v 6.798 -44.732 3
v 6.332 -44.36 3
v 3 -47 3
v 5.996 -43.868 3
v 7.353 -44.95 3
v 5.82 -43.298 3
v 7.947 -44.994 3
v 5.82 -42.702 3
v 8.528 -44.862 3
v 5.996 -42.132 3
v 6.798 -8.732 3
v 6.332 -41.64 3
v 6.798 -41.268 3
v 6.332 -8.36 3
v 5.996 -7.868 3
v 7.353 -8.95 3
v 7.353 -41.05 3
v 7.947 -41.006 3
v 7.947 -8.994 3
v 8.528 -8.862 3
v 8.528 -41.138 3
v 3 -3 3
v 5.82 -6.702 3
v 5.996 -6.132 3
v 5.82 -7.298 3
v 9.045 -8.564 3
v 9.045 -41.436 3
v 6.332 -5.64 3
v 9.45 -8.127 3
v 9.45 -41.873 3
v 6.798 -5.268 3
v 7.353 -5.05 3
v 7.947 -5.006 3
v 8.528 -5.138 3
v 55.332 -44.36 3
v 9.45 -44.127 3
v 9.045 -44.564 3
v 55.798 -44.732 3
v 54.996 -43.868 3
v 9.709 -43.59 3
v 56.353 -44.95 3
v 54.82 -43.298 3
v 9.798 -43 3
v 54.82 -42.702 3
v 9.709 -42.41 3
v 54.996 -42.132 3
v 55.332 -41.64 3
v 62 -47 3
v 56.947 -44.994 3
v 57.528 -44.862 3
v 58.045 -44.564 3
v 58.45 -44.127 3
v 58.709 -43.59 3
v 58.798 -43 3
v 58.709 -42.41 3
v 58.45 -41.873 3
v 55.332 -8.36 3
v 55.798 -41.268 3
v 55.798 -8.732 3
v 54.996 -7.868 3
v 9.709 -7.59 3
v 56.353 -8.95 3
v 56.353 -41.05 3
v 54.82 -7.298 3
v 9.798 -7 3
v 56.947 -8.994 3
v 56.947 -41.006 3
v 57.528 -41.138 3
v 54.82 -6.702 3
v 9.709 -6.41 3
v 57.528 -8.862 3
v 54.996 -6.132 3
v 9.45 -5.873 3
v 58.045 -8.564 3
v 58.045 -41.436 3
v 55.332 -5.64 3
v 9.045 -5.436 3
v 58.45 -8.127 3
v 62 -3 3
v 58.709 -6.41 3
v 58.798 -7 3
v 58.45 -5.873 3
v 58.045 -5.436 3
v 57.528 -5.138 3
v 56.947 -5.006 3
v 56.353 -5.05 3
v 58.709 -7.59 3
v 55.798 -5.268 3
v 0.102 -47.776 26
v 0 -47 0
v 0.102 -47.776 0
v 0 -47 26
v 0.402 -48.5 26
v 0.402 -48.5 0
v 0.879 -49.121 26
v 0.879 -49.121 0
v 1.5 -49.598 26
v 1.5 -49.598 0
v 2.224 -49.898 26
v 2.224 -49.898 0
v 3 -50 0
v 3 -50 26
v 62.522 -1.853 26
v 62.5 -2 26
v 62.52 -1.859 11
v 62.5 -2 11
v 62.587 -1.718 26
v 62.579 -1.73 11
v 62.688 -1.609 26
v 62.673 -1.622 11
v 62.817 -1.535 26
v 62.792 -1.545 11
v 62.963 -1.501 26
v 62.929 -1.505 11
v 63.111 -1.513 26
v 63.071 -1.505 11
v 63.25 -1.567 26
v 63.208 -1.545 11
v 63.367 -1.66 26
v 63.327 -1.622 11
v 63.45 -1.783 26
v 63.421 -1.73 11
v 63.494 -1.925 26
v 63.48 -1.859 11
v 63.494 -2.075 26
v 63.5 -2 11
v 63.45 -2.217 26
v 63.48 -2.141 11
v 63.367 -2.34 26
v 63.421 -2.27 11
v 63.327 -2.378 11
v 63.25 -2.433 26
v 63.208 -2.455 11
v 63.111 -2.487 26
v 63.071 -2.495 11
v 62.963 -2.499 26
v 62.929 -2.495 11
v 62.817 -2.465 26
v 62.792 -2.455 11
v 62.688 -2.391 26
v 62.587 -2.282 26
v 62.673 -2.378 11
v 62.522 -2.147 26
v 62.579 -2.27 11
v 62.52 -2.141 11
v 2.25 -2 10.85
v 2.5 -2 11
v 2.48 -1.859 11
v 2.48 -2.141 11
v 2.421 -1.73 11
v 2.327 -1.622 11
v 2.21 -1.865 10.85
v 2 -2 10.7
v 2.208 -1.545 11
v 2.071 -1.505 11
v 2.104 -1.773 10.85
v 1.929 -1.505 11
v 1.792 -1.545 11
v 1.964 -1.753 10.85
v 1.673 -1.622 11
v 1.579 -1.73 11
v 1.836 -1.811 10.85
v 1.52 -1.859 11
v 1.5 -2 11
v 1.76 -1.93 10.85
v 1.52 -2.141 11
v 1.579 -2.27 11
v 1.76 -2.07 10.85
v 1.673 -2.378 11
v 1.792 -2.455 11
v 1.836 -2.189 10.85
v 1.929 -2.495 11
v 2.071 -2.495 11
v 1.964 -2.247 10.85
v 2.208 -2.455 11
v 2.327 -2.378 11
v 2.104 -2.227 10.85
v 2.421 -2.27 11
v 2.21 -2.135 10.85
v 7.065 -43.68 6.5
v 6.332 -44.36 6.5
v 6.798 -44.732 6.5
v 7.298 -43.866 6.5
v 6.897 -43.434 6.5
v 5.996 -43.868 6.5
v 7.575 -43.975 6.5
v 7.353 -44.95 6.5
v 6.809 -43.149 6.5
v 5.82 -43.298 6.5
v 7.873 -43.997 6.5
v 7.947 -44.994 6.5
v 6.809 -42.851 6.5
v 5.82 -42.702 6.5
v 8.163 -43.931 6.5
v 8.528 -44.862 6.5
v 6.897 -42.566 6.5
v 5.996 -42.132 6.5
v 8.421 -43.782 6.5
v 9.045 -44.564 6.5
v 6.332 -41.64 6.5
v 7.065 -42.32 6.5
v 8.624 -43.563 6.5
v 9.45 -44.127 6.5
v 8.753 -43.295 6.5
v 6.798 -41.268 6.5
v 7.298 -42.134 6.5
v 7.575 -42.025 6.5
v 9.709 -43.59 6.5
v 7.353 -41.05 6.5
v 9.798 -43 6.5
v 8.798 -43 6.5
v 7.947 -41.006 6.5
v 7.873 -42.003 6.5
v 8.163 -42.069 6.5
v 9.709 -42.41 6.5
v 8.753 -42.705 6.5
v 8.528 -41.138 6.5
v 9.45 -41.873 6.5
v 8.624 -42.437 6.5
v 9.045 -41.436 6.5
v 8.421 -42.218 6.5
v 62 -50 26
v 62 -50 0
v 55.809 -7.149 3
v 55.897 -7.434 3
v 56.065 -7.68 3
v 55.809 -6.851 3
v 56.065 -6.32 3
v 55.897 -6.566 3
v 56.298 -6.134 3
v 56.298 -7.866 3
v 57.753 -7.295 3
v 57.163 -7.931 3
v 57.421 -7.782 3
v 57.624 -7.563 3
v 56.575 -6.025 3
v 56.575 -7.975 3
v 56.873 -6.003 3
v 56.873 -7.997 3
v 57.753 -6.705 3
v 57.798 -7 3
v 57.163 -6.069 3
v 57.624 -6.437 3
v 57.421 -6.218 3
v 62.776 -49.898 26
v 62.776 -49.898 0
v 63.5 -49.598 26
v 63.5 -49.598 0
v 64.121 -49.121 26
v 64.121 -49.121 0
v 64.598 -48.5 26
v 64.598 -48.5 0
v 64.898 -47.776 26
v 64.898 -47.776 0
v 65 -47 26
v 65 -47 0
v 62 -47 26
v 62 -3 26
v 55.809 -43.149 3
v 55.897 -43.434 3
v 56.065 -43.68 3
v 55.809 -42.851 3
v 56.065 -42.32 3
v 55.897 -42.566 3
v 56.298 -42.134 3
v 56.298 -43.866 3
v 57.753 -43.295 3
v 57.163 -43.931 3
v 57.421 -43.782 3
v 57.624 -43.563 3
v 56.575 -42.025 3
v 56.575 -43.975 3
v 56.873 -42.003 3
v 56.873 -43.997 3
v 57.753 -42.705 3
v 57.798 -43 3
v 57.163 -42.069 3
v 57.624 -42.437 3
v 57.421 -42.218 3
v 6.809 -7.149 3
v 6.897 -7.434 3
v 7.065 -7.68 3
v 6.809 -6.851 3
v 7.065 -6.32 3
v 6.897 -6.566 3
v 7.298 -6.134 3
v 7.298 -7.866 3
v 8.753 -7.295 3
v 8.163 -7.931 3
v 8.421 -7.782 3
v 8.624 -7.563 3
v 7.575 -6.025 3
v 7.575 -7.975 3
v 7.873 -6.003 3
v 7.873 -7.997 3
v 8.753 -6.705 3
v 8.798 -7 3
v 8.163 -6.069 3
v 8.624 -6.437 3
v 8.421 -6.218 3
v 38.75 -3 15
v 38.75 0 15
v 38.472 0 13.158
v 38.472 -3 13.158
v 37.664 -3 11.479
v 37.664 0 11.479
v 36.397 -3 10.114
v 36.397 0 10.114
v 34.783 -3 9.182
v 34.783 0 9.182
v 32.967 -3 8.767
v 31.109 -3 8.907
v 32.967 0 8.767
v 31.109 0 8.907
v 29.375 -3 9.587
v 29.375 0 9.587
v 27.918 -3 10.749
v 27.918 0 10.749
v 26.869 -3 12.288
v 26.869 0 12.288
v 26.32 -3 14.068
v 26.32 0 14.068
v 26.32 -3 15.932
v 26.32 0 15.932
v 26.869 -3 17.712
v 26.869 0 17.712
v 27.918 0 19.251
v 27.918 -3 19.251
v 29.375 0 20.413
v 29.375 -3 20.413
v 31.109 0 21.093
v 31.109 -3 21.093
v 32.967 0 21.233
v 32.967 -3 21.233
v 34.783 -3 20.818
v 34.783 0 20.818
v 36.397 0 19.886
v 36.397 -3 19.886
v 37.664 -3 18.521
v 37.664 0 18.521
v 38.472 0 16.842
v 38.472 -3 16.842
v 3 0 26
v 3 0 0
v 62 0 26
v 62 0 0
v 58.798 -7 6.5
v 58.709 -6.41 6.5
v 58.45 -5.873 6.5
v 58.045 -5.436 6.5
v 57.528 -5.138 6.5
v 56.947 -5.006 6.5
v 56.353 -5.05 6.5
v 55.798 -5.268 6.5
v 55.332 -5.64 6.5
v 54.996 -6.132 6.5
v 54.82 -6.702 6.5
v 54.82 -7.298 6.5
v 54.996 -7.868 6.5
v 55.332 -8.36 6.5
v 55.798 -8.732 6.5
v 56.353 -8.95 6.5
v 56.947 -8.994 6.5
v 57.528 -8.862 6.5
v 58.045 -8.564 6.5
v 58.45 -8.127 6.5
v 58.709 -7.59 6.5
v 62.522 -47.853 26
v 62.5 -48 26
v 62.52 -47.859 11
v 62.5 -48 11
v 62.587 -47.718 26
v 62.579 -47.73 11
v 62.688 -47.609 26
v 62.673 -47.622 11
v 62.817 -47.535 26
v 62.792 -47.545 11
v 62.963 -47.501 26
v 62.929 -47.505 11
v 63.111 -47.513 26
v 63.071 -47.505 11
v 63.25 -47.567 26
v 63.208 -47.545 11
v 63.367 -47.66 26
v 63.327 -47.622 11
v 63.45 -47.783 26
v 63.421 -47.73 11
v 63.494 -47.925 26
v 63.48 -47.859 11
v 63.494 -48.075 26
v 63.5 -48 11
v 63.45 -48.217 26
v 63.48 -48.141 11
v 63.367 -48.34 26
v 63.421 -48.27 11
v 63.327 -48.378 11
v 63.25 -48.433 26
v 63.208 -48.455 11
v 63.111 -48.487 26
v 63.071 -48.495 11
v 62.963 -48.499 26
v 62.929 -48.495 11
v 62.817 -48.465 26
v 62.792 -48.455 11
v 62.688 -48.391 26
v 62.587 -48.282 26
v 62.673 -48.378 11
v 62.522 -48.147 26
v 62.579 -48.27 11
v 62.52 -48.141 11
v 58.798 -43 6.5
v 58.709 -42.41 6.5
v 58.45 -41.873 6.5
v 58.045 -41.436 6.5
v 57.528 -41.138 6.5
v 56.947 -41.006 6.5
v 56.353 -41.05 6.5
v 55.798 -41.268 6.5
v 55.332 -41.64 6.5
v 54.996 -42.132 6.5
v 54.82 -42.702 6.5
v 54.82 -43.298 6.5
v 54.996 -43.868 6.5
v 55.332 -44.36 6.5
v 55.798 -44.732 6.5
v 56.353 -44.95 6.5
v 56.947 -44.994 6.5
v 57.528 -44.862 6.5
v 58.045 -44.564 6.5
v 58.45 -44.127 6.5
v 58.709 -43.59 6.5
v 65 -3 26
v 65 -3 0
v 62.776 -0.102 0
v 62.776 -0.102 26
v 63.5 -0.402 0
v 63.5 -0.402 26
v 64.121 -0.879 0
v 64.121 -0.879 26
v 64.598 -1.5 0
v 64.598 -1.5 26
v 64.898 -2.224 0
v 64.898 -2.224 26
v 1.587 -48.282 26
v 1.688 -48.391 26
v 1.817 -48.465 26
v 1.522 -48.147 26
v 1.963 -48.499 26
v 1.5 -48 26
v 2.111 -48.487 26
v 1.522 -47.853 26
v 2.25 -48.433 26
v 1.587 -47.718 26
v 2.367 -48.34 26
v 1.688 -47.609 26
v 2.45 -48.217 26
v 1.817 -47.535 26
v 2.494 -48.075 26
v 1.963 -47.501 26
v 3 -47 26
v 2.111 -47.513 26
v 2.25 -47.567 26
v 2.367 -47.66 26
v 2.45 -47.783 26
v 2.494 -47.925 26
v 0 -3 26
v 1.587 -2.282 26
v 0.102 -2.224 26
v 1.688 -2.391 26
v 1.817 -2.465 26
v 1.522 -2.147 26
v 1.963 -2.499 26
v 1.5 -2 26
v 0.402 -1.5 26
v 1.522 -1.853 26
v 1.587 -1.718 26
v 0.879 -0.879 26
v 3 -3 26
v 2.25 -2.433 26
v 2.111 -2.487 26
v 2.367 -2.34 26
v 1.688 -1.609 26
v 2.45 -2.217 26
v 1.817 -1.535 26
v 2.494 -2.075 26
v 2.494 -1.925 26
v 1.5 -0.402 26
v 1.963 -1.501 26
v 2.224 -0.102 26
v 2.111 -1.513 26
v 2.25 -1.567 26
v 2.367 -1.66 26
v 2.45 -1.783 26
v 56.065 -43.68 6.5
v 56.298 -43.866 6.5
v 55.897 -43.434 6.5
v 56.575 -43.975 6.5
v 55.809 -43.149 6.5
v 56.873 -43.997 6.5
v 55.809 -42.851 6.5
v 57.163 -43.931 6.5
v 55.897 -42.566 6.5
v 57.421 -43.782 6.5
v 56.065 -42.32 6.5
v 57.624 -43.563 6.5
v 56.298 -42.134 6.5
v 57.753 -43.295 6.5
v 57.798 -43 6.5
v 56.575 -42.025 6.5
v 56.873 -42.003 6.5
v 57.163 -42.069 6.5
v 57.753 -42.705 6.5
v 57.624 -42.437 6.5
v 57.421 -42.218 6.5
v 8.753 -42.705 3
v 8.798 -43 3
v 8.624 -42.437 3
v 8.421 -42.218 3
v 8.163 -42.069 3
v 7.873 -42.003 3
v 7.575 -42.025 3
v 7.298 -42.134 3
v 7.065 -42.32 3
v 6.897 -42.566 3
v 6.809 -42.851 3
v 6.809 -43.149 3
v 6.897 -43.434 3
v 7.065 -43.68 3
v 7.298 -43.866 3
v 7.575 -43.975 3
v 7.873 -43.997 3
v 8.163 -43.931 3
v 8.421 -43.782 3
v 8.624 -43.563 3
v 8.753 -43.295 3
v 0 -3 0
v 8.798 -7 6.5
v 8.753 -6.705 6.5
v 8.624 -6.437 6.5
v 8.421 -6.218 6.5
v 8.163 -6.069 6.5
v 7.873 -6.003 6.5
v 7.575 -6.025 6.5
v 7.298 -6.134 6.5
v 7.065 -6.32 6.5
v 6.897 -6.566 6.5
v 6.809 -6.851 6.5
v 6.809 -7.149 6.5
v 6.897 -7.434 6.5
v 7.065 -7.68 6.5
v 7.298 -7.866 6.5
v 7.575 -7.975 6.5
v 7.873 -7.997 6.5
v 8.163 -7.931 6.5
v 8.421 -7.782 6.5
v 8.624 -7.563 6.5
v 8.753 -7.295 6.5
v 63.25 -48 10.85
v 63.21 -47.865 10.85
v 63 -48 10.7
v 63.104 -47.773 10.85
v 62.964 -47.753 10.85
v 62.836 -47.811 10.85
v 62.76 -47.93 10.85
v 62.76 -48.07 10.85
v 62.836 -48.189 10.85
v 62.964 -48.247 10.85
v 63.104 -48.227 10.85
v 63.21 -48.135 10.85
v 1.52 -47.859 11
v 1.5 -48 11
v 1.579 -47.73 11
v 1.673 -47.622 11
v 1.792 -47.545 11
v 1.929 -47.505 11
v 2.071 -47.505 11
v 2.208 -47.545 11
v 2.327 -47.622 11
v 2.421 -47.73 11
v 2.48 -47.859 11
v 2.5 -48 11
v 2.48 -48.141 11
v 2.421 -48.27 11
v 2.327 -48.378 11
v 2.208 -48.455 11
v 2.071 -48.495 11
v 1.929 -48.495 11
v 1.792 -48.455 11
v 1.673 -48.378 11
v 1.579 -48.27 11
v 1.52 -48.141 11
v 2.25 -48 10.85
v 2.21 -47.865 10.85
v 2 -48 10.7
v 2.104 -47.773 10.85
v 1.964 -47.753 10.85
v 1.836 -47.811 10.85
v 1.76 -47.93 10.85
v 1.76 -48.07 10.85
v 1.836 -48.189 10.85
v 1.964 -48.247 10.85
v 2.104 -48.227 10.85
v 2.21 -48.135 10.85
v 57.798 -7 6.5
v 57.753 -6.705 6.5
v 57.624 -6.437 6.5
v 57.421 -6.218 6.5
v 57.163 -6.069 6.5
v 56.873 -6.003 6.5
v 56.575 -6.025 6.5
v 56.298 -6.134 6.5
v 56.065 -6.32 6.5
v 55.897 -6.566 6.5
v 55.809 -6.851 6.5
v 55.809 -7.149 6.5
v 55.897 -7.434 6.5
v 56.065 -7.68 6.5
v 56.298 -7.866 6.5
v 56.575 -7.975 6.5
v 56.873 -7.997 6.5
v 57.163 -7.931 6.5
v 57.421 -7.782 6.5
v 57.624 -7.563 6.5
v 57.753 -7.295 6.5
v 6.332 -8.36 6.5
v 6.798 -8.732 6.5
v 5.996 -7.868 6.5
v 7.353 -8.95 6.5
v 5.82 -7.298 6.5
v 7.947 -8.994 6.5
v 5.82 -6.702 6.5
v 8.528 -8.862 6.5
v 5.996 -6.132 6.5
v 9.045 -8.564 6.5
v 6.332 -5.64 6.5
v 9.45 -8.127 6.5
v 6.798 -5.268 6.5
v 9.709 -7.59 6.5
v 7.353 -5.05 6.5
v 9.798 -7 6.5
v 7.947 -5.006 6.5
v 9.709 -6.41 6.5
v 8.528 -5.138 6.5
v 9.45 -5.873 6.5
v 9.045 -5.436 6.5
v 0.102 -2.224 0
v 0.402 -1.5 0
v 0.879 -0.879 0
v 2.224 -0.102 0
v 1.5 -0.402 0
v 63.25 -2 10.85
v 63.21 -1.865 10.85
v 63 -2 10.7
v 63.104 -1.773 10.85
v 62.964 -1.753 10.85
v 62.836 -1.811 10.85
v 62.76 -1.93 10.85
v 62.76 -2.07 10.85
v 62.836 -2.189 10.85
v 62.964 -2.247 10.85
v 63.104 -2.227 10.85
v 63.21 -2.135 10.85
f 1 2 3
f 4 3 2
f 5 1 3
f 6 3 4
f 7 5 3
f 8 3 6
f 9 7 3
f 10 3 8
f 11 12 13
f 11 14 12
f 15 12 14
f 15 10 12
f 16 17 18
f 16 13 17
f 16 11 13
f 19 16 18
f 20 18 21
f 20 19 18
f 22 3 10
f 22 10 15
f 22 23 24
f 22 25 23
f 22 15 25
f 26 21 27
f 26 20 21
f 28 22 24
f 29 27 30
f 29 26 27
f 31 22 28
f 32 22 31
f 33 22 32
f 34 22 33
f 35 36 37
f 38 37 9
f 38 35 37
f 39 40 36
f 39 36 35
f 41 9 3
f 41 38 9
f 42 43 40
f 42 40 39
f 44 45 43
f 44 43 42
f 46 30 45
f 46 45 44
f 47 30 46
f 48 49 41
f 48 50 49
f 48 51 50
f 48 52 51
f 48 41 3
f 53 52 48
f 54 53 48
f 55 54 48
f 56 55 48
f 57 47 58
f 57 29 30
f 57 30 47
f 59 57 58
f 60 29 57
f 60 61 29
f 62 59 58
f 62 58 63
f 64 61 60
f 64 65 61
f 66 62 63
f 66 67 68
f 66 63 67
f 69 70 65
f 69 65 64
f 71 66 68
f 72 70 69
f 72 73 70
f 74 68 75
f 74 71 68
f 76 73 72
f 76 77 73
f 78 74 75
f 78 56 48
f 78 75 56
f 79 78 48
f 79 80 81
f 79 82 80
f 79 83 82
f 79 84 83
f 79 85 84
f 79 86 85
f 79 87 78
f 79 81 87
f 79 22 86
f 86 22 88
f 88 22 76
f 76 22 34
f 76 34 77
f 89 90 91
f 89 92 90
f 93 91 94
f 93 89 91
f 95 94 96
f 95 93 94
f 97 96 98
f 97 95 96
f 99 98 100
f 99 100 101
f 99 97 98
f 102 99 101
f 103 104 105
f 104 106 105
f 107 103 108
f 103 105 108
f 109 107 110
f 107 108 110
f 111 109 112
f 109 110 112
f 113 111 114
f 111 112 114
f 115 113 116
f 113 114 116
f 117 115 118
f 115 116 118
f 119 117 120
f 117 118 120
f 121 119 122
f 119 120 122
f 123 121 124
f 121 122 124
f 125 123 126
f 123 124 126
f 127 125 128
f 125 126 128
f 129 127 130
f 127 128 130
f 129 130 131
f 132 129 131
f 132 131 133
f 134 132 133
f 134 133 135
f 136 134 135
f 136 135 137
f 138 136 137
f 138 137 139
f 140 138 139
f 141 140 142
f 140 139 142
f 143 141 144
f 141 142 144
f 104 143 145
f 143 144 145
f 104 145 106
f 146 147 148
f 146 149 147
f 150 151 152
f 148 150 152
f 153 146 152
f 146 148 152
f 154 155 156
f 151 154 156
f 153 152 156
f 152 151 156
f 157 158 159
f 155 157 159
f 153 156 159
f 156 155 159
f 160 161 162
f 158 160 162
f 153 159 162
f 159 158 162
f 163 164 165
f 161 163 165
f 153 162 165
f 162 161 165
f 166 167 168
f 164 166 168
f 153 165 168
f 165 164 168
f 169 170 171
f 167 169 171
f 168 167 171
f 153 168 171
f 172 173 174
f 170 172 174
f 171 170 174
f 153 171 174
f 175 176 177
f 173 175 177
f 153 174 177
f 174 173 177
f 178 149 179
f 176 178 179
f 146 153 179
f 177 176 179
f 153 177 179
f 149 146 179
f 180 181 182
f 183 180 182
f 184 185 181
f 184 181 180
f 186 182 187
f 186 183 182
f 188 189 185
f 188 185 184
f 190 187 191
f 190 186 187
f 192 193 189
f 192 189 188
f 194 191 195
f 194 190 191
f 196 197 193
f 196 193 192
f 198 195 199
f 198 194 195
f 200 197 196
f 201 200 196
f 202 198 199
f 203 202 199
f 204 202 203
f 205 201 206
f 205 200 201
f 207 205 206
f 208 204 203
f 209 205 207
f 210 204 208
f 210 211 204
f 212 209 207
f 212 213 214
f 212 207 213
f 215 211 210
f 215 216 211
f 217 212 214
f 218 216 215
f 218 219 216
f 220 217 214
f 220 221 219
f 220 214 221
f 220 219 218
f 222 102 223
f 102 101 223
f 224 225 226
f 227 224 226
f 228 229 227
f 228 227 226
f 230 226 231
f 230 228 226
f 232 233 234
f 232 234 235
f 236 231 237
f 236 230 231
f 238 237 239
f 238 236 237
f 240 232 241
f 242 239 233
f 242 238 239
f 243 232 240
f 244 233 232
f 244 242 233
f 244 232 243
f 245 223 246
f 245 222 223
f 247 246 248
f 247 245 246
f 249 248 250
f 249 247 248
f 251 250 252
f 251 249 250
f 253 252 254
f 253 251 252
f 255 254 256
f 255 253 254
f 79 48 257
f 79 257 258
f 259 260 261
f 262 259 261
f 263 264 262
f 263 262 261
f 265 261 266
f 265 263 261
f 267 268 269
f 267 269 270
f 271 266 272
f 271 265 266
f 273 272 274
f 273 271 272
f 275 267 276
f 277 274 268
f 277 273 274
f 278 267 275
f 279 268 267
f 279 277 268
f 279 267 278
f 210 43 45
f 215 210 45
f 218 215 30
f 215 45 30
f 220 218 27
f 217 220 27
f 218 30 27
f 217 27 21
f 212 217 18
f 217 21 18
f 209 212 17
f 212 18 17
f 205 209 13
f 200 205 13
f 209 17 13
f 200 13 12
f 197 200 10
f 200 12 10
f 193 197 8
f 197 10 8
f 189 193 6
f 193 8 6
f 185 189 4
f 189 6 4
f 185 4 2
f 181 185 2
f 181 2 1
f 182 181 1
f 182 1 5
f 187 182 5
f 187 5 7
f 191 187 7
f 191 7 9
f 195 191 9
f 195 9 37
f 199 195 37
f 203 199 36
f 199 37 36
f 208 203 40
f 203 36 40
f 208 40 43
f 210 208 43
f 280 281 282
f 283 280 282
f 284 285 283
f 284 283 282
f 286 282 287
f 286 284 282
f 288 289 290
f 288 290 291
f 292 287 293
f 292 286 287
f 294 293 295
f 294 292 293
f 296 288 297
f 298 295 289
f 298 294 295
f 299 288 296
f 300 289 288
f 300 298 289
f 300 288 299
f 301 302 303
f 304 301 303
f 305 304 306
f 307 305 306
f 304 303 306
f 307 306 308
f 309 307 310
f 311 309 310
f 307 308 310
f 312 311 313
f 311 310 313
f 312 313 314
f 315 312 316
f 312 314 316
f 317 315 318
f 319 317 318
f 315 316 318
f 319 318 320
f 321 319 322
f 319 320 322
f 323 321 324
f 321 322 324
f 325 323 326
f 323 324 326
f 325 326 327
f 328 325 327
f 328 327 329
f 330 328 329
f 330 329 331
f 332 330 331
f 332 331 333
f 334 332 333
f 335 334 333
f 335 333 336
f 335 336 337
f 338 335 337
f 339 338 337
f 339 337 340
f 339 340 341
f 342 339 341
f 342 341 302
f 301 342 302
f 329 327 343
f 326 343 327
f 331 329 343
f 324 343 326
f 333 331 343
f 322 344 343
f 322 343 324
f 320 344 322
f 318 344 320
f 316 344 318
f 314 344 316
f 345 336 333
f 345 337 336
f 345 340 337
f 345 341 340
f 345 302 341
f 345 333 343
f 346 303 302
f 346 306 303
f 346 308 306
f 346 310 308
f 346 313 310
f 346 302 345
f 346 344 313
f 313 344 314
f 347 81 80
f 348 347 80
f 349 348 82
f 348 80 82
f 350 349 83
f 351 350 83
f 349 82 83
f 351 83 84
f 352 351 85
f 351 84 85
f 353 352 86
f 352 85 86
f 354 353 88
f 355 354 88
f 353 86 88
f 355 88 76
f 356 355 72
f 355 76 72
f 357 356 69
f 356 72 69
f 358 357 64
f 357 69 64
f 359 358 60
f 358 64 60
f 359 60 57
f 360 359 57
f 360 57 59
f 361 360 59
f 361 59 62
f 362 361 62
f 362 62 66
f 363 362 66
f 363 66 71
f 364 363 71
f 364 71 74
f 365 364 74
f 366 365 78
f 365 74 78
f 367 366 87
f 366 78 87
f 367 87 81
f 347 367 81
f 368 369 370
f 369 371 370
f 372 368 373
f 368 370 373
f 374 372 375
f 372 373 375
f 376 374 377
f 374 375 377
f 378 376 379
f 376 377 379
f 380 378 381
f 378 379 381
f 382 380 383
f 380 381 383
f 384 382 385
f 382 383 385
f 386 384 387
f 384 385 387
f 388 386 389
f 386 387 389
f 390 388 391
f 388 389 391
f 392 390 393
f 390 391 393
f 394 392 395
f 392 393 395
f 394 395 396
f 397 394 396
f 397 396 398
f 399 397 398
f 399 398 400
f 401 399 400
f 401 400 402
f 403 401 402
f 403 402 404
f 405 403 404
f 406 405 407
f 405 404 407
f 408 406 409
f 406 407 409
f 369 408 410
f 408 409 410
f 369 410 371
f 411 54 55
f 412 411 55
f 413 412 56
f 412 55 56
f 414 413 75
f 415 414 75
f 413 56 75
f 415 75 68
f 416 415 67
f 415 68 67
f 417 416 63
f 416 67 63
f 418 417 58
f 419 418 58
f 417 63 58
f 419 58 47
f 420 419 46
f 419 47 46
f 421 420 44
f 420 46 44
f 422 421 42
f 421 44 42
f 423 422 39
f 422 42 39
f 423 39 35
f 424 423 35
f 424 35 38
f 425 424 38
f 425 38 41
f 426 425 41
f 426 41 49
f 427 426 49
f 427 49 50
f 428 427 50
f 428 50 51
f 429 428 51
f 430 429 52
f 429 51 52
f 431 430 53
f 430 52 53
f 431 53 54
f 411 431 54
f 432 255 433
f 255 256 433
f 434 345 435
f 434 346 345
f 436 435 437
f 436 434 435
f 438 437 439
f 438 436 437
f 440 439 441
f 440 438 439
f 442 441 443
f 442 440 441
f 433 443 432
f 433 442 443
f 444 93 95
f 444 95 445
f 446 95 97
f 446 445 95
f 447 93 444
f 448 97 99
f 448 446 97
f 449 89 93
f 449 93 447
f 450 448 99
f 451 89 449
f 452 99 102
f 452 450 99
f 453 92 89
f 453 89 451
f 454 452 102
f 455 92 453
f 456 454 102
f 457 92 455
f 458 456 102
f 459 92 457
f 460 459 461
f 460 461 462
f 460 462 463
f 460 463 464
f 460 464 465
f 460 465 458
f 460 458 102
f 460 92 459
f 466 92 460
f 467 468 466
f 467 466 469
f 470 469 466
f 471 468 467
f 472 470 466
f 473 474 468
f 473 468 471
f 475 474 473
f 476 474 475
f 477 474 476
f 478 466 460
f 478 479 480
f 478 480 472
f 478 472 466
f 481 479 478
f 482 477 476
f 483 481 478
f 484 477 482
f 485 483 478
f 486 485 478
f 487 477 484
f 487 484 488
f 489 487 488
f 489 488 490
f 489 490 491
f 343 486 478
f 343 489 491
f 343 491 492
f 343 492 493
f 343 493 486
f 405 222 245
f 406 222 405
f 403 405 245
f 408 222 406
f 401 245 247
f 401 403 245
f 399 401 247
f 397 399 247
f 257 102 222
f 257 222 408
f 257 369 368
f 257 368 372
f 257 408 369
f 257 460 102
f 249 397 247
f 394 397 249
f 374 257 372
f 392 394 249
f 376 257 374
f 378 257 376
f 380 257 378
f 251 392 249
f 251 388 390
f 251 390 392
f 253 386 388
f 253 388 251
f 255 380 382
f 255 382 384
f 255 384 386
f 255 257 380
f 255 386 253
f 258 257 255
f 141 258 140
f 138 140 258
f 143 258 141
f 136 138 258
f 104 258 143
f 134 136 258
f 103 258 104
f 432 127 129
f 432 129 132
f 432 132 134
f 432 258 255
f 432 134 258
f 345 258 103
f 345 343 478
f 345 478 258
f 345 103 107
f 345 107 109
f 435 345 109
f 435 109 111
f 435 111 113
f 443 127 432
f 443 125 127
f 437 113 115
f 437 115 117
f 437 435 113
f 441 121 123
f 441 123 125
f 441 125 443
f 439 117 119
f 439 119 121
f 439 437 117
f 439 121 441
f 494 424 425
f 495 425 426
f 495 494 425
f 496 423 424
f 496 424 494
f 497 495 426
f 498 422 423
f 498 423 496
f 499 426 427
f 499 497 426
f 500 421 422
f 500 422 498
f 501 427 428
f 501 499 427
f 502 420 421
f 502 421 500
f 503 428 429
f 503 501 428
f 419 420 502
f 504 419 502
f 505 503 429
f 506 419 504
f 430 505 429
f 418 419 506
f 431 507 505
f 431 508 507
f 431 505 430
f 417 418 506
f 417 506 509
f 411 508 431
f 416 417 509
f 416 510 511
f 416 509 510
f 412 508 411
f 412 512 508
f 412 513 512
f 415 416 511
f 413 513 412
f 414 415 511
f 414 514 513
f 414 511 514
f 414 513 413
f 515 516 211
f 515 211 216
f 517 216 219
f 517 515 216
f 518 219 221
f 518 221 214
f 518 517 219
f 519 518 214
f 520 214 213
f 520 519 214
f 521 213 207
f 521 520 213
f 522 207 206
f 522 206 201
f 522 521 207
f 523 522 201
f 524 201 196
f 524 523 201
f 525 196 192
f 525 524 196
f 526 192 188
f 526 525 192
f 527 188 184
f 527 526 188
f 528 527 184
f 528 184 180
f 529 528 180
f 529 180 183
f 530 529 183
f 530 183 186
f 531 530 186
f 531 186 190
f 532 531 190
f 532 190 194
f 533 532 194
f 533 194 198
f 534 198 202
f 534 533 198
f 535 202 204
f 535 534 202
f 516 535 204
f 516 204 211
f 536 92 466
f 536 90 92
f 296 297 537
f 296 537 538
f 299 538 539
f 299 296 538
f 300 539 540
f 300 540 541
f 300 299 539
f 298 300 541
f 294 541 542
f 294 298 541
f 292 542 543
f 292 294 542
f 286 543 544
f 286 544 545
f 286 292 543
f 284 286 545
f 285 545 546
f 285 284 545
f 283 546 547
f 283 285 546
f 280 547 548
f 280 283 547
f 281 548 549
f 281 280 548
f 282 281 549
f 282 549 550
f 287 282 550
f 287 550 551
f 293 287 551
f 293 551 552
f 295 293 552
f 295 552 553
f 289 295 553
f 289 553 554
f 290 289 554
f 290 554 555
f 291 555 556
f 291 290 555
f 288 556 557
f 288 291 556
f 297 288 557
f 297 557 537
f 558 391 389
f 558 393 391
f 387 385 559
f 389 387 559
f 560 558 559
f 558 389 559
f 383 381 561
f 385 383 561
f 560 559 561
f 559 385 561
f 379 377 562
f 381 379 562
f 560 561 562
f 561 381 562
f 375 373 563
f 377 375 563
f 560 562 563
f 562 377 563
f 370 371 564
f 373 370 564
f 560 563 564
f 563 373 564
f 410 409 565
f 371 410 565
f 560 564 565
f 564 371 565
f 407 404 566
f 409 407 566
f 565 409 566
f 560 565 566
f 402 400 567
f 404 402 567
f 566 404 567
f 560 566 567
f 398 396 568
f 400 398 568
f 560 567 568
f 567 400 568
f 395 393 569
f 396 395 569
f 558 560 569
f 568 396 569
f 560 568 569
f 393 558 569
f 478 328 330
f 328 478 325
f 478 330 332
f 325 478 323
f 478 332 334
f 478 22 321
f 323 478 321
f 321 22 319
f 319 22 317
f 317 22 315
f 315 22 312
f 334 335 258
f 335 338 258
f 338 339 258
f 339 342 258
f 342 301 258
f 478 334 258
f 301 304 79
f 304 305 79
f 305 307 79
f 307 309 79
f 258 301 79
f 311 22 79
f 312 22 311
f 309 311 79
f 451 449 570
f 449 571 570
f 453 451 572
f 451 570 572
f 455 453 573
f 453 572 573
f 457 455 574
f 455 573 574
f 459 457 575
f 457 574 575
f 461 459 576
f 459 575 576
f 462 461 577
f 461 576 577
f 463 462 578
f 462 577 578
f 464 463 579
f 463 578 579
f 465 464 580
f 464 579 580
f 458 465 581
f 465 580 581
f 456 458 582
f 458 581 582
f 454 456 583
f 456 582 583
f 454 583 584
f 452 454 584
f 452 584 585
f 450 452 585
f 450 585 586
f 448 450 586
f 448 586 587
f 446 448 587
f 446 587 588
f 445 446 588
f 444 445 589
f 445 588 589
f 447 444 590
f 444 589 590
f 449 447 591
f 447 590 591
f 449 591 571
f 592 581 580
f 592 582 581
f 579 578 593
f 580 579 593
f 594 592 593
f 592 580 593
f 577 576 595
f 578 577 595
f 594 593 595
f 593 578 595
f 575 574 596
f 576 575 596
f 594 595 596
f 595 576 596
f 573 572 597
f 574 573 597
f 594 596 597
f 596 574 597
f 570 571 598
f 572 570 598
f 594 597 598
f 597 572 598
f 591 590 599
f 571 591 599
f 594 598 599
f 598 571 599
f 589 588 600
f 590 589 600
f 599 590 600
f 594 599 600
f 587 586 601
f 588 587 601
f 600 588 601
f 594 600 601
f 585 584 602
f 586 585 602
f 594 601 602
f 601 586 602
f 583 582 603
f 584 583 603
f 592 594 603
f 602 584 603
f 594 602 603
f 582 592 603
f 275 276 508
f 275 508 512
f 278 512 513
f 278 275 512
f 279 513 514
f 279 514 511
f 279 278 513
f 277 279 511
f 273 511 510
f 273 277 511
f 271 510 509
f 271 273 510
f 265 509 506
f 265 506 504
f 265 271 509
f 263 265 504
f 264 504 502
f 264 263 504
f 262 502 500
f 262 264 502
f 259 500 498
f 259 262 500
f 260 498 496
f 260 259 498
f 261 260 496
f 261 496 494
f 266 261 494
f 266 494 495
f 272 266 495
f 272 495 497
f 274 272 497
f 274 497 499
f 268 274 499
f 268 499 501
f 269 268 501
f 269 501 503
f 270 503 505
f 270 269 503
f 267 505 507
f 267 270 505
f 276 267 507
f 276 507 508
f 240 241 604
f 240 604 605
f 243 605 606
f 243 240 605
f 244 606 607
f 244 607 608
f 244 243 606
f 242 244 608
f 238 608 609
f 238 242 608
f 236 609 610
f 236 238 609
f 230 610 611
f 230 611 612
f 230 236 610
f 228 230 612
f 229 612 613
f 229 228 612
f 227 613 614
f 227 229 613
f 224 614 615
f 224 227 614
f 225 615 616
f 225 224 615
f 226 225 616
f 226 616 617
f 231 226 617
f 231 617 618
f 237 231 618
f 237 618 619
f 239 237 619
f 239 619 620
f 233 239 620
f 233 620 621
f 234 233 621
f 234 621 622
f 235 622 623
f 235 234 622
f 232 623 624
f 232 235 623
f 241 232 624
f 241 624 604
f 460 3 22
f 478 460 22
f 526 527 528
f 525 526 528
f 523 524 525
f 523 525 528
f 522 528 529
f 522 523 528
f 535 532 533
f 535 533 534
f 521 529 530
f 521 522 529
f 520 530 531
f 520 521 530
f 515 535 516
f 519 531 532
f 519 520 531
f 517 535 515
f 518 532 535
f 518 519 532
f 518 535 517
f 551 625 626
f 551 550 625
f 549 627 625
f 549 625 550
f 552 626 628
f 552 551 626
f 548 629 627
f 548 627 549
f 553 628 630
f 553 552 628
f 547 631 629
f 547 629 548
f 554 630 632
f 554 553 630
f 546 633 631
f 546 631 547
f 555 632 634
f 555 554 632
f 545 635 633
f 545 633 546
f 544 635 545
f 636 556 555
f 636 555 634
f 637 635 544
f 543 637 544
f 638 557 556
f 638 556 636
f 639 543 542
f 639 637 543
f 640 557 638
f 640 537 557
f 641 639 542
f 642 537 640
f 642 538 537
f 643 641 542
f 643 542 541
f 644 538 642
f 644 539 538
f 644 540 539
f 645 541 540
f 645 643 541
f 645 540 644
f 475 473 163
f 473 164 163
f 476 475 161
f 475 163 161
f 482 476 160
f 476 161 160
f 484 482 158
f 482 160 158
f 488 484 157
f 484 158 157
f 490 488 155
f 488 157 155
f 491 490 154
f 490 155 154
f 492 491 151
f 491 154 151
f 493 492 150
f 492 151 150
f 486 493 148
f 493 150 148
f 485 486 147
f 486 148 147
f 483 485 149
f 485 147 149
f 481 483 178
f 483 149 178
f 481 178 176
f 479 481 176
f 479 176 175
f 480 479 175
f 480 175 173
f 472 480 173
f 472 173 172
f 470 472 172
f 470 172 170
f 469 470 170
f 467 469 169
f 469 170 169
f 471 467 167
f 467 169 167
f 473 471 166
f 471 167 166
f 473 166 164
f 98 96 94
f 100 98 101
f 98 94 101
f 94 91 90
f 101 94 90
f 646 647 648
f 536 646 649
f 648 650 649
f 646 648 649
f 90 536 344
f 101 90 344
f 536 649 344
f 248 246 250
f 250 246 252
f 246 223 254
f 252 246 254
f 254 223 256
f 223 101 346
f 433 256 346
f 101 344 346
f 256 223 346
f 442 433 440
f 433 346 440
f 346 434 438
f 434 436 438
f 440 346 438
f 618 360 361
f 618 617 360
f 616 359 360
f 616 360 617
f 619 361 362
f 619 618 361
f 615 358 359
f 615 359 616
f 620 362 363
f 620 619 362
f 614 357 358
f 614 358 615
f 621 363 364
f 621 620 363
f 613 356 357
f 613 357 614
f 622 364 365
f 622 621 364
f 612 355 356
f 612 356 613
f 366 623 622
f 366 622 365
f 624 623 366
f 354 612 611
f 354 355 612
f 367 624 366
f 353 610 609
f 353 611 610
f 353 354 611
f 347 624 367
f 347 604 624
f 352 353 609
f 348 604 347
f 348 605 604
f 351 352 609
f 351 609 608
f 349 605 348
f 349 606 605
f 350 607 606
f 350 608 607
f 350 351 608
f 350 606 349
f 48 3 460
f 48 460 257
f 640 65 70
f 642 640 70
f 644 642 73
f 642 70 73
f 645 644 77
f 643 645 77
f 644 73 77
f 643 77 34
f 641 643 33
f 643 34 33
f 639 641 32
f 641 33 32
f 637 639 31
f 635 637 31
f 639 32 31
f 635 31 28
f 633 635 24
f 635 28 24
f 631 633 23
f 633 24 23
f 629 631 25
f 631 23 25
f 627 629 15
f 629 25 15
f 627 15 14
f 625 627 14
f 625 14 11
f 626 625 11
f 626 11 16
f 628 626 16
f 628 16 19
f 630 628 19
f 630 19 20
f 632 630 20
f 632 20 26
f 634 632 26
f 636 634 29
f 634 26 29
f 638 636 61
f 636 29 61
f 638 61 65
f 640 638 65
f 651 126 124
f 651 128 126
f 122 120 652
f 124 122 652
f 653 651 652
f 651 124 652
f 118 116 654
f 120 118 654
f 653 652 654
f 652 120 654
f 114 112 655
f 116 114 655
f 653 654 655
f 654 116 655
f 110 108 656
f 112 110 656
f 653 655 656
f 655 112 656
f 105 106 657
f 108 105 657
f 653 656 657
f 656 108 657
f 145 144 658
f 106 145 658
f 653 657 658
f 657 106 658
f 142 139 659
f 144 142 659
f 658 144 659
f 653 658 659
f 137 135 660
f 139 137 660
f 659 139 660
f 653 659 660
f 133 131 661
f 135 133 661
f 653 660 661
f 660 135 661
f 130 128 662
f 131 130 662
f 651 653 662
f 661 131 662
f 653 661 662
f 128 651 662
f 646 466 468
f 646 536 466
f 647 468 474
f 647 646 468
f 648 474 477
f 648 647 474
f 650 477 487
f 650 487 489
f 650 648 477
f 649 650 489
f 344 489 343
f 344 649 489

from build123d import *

# Parameters (mm, degrees)
SKIZZE1_W                          = 65
SKIZZE1_H                          = 50
AUFSATZ_LINEAR_AUSTRAGEN1_DEPTH    = 3
SKIZZE2_W                          = 65
SKIZZE2_H                          = 50
SKIZZE2_W_2                        = 59
SKIZZE2_H_2                        = 44
AUFSATZ_LINEAR_AUSTRAGEN2_DEPTH    = 23
SKIZZE4_R                          = 2
SKIZZE4_R_2                        = 1
AUFSATZ_LINEAR_AUSTRAGEN3_DEPTH    = 3.5
SCHNITT_LINEAR_AUSTRAGEN1_REACH    = 52
SKIZZE5_R                          = 6.25
VERRUNDUNG1_R                      = 3
F_1_0_1_DURCHMESSER_BOHRUNG1_D     = 1
F_1_0_1_DURCHMESSER_BOHRUNG1_DEPTH = 15
F_1_0_1_DURCHMESSER_BOHRUNG1_TIP   = 0.30043031


with BuildPart() as part:
    # Skizze1 → Aufsatz-Linear austragen1 (new body)
    with BuildSketch(Plane.XY):
        with Locations((32.5, -25)):
            Rectangle(SKIZZE1_W, SKIZZE1_H)
    extrude(amount=AUFSATZ_LINEAR_AUSTRAGEN1_DEPTH)

    # Skizze2 → Aufsatz-Linear austragen2 (add)
    with BuildSketch(Plane.XY.offset(3)):
        with Locations((32.5, -25)):
            Rectangle(SKIZZE2_W, SKIZZE2_H)
        with Locations((32.5, -25)):
            Rectangle(SKIZZE2_W_2, SKIZZE2_H_2, mode=Mode.SUBTRACT)
    extrude(amount=AUFSATZ_LINEAR_AUSTRAGEN2_DEPTH)

    # Skizze4 → Aufsatz-Linear austragen3 (add)
    with BuildSketch(Plane.XY.offset(3)):
        with Locations((7.797786215, -7)):
            Circle(SKIZZE4_R)
        with Locations((7.797786215, -7)):
            Circle(SKIZZE4_R_2, mode=Mode.SUBTRACT)
        with Locations((56.797786215, -7)):
            Circle(SKIZZE4_R)
        with Locations((56.797786215, -7)):
            Circle(SKIZZE4_R_2, mode=Mode.SUBTRACT)
        with Locations((56.797786215, -43)):
            Circle(SKIZZE4_R)
        with Locations((56.797786215, -43)):
            Circle(SKIZZE4_R_2, mode=Mode.SUBTRACT)
        with Locations((7.797786215, -43)):
            Circle(SKIZZE4_R)
        with Locations((7.797786215, -43)):
            Circle(SKIZZE4_R_2, mode=Mode.SUBTRACT)
    extrude(amount=AUFSATZ_LINEAR_AUSTRAGEN3_DEPTH)

    # Skizze5 → Schnitt-Linear austragen1 (cut, up to next)
    with BuildSketch(Plane(origin=(0, 0, 0), x_dir=(1, 0, 0), z_dir=(0, 1, 0)), mode=Mode.PRIVATE) as schnitt_linear_austragen1_sk1:
        with Locations((32.5, -15)):
            Circle(SKIZZE5_R)
    schnitt_linear_austragen1_tool1 = extrude(schnitt_linear_austragen1_sk1.sketch, amount=-SCHNITT_LINEAR_AUSTRAGEN1_REACH, mode=Mode.PRIVATE) & part.part
    add(schnitt_linear_austragen1_tool1.solids().sort_by_distance((32.5, 0, 15))[0], mode=Mode.SUBTRACT)

    # Verrundung1
    verrundung1_edges = [part.edges().sort_by_distance(p)[0] for p in [
        (0, 0, 13),
        (65, 0, 13),
        (65, -50, 13),
        (0, -50, 13),
    ]]
    fillet(verrundung1_edges, radius=VERRUNDUNG1_R)

    # Ø1.0 (1) Durchmesser Bohrung1
    with Locations(Plane.XY.offset(26)):
        with Locations((63, -48), (63, -2), (2, -2), (2, -48)):
            Hole(F_1_0_1_DURCHMESSER_BOHRUNG1_D / 2, depth=F_1_0_1_DURCHMESSER_BOHRUNG1_DEPTH)
            with Locations((0, 0, -(F_1_0_1_DURCHMESSER_BOHRUNG1_DEPTH + F_1_0_1_DURCHMESSER_BOHRUNG1_TIP / 2))):  # 118° drill point
                Cone(0, F_1_0_1_DURCHMESSER_BOHRUNG1_D / 2, F_1_0_1_DURCHMESSER_BOHRUNG1_TIP, mode=Mode.SUBTRACT)


solid = part.part
